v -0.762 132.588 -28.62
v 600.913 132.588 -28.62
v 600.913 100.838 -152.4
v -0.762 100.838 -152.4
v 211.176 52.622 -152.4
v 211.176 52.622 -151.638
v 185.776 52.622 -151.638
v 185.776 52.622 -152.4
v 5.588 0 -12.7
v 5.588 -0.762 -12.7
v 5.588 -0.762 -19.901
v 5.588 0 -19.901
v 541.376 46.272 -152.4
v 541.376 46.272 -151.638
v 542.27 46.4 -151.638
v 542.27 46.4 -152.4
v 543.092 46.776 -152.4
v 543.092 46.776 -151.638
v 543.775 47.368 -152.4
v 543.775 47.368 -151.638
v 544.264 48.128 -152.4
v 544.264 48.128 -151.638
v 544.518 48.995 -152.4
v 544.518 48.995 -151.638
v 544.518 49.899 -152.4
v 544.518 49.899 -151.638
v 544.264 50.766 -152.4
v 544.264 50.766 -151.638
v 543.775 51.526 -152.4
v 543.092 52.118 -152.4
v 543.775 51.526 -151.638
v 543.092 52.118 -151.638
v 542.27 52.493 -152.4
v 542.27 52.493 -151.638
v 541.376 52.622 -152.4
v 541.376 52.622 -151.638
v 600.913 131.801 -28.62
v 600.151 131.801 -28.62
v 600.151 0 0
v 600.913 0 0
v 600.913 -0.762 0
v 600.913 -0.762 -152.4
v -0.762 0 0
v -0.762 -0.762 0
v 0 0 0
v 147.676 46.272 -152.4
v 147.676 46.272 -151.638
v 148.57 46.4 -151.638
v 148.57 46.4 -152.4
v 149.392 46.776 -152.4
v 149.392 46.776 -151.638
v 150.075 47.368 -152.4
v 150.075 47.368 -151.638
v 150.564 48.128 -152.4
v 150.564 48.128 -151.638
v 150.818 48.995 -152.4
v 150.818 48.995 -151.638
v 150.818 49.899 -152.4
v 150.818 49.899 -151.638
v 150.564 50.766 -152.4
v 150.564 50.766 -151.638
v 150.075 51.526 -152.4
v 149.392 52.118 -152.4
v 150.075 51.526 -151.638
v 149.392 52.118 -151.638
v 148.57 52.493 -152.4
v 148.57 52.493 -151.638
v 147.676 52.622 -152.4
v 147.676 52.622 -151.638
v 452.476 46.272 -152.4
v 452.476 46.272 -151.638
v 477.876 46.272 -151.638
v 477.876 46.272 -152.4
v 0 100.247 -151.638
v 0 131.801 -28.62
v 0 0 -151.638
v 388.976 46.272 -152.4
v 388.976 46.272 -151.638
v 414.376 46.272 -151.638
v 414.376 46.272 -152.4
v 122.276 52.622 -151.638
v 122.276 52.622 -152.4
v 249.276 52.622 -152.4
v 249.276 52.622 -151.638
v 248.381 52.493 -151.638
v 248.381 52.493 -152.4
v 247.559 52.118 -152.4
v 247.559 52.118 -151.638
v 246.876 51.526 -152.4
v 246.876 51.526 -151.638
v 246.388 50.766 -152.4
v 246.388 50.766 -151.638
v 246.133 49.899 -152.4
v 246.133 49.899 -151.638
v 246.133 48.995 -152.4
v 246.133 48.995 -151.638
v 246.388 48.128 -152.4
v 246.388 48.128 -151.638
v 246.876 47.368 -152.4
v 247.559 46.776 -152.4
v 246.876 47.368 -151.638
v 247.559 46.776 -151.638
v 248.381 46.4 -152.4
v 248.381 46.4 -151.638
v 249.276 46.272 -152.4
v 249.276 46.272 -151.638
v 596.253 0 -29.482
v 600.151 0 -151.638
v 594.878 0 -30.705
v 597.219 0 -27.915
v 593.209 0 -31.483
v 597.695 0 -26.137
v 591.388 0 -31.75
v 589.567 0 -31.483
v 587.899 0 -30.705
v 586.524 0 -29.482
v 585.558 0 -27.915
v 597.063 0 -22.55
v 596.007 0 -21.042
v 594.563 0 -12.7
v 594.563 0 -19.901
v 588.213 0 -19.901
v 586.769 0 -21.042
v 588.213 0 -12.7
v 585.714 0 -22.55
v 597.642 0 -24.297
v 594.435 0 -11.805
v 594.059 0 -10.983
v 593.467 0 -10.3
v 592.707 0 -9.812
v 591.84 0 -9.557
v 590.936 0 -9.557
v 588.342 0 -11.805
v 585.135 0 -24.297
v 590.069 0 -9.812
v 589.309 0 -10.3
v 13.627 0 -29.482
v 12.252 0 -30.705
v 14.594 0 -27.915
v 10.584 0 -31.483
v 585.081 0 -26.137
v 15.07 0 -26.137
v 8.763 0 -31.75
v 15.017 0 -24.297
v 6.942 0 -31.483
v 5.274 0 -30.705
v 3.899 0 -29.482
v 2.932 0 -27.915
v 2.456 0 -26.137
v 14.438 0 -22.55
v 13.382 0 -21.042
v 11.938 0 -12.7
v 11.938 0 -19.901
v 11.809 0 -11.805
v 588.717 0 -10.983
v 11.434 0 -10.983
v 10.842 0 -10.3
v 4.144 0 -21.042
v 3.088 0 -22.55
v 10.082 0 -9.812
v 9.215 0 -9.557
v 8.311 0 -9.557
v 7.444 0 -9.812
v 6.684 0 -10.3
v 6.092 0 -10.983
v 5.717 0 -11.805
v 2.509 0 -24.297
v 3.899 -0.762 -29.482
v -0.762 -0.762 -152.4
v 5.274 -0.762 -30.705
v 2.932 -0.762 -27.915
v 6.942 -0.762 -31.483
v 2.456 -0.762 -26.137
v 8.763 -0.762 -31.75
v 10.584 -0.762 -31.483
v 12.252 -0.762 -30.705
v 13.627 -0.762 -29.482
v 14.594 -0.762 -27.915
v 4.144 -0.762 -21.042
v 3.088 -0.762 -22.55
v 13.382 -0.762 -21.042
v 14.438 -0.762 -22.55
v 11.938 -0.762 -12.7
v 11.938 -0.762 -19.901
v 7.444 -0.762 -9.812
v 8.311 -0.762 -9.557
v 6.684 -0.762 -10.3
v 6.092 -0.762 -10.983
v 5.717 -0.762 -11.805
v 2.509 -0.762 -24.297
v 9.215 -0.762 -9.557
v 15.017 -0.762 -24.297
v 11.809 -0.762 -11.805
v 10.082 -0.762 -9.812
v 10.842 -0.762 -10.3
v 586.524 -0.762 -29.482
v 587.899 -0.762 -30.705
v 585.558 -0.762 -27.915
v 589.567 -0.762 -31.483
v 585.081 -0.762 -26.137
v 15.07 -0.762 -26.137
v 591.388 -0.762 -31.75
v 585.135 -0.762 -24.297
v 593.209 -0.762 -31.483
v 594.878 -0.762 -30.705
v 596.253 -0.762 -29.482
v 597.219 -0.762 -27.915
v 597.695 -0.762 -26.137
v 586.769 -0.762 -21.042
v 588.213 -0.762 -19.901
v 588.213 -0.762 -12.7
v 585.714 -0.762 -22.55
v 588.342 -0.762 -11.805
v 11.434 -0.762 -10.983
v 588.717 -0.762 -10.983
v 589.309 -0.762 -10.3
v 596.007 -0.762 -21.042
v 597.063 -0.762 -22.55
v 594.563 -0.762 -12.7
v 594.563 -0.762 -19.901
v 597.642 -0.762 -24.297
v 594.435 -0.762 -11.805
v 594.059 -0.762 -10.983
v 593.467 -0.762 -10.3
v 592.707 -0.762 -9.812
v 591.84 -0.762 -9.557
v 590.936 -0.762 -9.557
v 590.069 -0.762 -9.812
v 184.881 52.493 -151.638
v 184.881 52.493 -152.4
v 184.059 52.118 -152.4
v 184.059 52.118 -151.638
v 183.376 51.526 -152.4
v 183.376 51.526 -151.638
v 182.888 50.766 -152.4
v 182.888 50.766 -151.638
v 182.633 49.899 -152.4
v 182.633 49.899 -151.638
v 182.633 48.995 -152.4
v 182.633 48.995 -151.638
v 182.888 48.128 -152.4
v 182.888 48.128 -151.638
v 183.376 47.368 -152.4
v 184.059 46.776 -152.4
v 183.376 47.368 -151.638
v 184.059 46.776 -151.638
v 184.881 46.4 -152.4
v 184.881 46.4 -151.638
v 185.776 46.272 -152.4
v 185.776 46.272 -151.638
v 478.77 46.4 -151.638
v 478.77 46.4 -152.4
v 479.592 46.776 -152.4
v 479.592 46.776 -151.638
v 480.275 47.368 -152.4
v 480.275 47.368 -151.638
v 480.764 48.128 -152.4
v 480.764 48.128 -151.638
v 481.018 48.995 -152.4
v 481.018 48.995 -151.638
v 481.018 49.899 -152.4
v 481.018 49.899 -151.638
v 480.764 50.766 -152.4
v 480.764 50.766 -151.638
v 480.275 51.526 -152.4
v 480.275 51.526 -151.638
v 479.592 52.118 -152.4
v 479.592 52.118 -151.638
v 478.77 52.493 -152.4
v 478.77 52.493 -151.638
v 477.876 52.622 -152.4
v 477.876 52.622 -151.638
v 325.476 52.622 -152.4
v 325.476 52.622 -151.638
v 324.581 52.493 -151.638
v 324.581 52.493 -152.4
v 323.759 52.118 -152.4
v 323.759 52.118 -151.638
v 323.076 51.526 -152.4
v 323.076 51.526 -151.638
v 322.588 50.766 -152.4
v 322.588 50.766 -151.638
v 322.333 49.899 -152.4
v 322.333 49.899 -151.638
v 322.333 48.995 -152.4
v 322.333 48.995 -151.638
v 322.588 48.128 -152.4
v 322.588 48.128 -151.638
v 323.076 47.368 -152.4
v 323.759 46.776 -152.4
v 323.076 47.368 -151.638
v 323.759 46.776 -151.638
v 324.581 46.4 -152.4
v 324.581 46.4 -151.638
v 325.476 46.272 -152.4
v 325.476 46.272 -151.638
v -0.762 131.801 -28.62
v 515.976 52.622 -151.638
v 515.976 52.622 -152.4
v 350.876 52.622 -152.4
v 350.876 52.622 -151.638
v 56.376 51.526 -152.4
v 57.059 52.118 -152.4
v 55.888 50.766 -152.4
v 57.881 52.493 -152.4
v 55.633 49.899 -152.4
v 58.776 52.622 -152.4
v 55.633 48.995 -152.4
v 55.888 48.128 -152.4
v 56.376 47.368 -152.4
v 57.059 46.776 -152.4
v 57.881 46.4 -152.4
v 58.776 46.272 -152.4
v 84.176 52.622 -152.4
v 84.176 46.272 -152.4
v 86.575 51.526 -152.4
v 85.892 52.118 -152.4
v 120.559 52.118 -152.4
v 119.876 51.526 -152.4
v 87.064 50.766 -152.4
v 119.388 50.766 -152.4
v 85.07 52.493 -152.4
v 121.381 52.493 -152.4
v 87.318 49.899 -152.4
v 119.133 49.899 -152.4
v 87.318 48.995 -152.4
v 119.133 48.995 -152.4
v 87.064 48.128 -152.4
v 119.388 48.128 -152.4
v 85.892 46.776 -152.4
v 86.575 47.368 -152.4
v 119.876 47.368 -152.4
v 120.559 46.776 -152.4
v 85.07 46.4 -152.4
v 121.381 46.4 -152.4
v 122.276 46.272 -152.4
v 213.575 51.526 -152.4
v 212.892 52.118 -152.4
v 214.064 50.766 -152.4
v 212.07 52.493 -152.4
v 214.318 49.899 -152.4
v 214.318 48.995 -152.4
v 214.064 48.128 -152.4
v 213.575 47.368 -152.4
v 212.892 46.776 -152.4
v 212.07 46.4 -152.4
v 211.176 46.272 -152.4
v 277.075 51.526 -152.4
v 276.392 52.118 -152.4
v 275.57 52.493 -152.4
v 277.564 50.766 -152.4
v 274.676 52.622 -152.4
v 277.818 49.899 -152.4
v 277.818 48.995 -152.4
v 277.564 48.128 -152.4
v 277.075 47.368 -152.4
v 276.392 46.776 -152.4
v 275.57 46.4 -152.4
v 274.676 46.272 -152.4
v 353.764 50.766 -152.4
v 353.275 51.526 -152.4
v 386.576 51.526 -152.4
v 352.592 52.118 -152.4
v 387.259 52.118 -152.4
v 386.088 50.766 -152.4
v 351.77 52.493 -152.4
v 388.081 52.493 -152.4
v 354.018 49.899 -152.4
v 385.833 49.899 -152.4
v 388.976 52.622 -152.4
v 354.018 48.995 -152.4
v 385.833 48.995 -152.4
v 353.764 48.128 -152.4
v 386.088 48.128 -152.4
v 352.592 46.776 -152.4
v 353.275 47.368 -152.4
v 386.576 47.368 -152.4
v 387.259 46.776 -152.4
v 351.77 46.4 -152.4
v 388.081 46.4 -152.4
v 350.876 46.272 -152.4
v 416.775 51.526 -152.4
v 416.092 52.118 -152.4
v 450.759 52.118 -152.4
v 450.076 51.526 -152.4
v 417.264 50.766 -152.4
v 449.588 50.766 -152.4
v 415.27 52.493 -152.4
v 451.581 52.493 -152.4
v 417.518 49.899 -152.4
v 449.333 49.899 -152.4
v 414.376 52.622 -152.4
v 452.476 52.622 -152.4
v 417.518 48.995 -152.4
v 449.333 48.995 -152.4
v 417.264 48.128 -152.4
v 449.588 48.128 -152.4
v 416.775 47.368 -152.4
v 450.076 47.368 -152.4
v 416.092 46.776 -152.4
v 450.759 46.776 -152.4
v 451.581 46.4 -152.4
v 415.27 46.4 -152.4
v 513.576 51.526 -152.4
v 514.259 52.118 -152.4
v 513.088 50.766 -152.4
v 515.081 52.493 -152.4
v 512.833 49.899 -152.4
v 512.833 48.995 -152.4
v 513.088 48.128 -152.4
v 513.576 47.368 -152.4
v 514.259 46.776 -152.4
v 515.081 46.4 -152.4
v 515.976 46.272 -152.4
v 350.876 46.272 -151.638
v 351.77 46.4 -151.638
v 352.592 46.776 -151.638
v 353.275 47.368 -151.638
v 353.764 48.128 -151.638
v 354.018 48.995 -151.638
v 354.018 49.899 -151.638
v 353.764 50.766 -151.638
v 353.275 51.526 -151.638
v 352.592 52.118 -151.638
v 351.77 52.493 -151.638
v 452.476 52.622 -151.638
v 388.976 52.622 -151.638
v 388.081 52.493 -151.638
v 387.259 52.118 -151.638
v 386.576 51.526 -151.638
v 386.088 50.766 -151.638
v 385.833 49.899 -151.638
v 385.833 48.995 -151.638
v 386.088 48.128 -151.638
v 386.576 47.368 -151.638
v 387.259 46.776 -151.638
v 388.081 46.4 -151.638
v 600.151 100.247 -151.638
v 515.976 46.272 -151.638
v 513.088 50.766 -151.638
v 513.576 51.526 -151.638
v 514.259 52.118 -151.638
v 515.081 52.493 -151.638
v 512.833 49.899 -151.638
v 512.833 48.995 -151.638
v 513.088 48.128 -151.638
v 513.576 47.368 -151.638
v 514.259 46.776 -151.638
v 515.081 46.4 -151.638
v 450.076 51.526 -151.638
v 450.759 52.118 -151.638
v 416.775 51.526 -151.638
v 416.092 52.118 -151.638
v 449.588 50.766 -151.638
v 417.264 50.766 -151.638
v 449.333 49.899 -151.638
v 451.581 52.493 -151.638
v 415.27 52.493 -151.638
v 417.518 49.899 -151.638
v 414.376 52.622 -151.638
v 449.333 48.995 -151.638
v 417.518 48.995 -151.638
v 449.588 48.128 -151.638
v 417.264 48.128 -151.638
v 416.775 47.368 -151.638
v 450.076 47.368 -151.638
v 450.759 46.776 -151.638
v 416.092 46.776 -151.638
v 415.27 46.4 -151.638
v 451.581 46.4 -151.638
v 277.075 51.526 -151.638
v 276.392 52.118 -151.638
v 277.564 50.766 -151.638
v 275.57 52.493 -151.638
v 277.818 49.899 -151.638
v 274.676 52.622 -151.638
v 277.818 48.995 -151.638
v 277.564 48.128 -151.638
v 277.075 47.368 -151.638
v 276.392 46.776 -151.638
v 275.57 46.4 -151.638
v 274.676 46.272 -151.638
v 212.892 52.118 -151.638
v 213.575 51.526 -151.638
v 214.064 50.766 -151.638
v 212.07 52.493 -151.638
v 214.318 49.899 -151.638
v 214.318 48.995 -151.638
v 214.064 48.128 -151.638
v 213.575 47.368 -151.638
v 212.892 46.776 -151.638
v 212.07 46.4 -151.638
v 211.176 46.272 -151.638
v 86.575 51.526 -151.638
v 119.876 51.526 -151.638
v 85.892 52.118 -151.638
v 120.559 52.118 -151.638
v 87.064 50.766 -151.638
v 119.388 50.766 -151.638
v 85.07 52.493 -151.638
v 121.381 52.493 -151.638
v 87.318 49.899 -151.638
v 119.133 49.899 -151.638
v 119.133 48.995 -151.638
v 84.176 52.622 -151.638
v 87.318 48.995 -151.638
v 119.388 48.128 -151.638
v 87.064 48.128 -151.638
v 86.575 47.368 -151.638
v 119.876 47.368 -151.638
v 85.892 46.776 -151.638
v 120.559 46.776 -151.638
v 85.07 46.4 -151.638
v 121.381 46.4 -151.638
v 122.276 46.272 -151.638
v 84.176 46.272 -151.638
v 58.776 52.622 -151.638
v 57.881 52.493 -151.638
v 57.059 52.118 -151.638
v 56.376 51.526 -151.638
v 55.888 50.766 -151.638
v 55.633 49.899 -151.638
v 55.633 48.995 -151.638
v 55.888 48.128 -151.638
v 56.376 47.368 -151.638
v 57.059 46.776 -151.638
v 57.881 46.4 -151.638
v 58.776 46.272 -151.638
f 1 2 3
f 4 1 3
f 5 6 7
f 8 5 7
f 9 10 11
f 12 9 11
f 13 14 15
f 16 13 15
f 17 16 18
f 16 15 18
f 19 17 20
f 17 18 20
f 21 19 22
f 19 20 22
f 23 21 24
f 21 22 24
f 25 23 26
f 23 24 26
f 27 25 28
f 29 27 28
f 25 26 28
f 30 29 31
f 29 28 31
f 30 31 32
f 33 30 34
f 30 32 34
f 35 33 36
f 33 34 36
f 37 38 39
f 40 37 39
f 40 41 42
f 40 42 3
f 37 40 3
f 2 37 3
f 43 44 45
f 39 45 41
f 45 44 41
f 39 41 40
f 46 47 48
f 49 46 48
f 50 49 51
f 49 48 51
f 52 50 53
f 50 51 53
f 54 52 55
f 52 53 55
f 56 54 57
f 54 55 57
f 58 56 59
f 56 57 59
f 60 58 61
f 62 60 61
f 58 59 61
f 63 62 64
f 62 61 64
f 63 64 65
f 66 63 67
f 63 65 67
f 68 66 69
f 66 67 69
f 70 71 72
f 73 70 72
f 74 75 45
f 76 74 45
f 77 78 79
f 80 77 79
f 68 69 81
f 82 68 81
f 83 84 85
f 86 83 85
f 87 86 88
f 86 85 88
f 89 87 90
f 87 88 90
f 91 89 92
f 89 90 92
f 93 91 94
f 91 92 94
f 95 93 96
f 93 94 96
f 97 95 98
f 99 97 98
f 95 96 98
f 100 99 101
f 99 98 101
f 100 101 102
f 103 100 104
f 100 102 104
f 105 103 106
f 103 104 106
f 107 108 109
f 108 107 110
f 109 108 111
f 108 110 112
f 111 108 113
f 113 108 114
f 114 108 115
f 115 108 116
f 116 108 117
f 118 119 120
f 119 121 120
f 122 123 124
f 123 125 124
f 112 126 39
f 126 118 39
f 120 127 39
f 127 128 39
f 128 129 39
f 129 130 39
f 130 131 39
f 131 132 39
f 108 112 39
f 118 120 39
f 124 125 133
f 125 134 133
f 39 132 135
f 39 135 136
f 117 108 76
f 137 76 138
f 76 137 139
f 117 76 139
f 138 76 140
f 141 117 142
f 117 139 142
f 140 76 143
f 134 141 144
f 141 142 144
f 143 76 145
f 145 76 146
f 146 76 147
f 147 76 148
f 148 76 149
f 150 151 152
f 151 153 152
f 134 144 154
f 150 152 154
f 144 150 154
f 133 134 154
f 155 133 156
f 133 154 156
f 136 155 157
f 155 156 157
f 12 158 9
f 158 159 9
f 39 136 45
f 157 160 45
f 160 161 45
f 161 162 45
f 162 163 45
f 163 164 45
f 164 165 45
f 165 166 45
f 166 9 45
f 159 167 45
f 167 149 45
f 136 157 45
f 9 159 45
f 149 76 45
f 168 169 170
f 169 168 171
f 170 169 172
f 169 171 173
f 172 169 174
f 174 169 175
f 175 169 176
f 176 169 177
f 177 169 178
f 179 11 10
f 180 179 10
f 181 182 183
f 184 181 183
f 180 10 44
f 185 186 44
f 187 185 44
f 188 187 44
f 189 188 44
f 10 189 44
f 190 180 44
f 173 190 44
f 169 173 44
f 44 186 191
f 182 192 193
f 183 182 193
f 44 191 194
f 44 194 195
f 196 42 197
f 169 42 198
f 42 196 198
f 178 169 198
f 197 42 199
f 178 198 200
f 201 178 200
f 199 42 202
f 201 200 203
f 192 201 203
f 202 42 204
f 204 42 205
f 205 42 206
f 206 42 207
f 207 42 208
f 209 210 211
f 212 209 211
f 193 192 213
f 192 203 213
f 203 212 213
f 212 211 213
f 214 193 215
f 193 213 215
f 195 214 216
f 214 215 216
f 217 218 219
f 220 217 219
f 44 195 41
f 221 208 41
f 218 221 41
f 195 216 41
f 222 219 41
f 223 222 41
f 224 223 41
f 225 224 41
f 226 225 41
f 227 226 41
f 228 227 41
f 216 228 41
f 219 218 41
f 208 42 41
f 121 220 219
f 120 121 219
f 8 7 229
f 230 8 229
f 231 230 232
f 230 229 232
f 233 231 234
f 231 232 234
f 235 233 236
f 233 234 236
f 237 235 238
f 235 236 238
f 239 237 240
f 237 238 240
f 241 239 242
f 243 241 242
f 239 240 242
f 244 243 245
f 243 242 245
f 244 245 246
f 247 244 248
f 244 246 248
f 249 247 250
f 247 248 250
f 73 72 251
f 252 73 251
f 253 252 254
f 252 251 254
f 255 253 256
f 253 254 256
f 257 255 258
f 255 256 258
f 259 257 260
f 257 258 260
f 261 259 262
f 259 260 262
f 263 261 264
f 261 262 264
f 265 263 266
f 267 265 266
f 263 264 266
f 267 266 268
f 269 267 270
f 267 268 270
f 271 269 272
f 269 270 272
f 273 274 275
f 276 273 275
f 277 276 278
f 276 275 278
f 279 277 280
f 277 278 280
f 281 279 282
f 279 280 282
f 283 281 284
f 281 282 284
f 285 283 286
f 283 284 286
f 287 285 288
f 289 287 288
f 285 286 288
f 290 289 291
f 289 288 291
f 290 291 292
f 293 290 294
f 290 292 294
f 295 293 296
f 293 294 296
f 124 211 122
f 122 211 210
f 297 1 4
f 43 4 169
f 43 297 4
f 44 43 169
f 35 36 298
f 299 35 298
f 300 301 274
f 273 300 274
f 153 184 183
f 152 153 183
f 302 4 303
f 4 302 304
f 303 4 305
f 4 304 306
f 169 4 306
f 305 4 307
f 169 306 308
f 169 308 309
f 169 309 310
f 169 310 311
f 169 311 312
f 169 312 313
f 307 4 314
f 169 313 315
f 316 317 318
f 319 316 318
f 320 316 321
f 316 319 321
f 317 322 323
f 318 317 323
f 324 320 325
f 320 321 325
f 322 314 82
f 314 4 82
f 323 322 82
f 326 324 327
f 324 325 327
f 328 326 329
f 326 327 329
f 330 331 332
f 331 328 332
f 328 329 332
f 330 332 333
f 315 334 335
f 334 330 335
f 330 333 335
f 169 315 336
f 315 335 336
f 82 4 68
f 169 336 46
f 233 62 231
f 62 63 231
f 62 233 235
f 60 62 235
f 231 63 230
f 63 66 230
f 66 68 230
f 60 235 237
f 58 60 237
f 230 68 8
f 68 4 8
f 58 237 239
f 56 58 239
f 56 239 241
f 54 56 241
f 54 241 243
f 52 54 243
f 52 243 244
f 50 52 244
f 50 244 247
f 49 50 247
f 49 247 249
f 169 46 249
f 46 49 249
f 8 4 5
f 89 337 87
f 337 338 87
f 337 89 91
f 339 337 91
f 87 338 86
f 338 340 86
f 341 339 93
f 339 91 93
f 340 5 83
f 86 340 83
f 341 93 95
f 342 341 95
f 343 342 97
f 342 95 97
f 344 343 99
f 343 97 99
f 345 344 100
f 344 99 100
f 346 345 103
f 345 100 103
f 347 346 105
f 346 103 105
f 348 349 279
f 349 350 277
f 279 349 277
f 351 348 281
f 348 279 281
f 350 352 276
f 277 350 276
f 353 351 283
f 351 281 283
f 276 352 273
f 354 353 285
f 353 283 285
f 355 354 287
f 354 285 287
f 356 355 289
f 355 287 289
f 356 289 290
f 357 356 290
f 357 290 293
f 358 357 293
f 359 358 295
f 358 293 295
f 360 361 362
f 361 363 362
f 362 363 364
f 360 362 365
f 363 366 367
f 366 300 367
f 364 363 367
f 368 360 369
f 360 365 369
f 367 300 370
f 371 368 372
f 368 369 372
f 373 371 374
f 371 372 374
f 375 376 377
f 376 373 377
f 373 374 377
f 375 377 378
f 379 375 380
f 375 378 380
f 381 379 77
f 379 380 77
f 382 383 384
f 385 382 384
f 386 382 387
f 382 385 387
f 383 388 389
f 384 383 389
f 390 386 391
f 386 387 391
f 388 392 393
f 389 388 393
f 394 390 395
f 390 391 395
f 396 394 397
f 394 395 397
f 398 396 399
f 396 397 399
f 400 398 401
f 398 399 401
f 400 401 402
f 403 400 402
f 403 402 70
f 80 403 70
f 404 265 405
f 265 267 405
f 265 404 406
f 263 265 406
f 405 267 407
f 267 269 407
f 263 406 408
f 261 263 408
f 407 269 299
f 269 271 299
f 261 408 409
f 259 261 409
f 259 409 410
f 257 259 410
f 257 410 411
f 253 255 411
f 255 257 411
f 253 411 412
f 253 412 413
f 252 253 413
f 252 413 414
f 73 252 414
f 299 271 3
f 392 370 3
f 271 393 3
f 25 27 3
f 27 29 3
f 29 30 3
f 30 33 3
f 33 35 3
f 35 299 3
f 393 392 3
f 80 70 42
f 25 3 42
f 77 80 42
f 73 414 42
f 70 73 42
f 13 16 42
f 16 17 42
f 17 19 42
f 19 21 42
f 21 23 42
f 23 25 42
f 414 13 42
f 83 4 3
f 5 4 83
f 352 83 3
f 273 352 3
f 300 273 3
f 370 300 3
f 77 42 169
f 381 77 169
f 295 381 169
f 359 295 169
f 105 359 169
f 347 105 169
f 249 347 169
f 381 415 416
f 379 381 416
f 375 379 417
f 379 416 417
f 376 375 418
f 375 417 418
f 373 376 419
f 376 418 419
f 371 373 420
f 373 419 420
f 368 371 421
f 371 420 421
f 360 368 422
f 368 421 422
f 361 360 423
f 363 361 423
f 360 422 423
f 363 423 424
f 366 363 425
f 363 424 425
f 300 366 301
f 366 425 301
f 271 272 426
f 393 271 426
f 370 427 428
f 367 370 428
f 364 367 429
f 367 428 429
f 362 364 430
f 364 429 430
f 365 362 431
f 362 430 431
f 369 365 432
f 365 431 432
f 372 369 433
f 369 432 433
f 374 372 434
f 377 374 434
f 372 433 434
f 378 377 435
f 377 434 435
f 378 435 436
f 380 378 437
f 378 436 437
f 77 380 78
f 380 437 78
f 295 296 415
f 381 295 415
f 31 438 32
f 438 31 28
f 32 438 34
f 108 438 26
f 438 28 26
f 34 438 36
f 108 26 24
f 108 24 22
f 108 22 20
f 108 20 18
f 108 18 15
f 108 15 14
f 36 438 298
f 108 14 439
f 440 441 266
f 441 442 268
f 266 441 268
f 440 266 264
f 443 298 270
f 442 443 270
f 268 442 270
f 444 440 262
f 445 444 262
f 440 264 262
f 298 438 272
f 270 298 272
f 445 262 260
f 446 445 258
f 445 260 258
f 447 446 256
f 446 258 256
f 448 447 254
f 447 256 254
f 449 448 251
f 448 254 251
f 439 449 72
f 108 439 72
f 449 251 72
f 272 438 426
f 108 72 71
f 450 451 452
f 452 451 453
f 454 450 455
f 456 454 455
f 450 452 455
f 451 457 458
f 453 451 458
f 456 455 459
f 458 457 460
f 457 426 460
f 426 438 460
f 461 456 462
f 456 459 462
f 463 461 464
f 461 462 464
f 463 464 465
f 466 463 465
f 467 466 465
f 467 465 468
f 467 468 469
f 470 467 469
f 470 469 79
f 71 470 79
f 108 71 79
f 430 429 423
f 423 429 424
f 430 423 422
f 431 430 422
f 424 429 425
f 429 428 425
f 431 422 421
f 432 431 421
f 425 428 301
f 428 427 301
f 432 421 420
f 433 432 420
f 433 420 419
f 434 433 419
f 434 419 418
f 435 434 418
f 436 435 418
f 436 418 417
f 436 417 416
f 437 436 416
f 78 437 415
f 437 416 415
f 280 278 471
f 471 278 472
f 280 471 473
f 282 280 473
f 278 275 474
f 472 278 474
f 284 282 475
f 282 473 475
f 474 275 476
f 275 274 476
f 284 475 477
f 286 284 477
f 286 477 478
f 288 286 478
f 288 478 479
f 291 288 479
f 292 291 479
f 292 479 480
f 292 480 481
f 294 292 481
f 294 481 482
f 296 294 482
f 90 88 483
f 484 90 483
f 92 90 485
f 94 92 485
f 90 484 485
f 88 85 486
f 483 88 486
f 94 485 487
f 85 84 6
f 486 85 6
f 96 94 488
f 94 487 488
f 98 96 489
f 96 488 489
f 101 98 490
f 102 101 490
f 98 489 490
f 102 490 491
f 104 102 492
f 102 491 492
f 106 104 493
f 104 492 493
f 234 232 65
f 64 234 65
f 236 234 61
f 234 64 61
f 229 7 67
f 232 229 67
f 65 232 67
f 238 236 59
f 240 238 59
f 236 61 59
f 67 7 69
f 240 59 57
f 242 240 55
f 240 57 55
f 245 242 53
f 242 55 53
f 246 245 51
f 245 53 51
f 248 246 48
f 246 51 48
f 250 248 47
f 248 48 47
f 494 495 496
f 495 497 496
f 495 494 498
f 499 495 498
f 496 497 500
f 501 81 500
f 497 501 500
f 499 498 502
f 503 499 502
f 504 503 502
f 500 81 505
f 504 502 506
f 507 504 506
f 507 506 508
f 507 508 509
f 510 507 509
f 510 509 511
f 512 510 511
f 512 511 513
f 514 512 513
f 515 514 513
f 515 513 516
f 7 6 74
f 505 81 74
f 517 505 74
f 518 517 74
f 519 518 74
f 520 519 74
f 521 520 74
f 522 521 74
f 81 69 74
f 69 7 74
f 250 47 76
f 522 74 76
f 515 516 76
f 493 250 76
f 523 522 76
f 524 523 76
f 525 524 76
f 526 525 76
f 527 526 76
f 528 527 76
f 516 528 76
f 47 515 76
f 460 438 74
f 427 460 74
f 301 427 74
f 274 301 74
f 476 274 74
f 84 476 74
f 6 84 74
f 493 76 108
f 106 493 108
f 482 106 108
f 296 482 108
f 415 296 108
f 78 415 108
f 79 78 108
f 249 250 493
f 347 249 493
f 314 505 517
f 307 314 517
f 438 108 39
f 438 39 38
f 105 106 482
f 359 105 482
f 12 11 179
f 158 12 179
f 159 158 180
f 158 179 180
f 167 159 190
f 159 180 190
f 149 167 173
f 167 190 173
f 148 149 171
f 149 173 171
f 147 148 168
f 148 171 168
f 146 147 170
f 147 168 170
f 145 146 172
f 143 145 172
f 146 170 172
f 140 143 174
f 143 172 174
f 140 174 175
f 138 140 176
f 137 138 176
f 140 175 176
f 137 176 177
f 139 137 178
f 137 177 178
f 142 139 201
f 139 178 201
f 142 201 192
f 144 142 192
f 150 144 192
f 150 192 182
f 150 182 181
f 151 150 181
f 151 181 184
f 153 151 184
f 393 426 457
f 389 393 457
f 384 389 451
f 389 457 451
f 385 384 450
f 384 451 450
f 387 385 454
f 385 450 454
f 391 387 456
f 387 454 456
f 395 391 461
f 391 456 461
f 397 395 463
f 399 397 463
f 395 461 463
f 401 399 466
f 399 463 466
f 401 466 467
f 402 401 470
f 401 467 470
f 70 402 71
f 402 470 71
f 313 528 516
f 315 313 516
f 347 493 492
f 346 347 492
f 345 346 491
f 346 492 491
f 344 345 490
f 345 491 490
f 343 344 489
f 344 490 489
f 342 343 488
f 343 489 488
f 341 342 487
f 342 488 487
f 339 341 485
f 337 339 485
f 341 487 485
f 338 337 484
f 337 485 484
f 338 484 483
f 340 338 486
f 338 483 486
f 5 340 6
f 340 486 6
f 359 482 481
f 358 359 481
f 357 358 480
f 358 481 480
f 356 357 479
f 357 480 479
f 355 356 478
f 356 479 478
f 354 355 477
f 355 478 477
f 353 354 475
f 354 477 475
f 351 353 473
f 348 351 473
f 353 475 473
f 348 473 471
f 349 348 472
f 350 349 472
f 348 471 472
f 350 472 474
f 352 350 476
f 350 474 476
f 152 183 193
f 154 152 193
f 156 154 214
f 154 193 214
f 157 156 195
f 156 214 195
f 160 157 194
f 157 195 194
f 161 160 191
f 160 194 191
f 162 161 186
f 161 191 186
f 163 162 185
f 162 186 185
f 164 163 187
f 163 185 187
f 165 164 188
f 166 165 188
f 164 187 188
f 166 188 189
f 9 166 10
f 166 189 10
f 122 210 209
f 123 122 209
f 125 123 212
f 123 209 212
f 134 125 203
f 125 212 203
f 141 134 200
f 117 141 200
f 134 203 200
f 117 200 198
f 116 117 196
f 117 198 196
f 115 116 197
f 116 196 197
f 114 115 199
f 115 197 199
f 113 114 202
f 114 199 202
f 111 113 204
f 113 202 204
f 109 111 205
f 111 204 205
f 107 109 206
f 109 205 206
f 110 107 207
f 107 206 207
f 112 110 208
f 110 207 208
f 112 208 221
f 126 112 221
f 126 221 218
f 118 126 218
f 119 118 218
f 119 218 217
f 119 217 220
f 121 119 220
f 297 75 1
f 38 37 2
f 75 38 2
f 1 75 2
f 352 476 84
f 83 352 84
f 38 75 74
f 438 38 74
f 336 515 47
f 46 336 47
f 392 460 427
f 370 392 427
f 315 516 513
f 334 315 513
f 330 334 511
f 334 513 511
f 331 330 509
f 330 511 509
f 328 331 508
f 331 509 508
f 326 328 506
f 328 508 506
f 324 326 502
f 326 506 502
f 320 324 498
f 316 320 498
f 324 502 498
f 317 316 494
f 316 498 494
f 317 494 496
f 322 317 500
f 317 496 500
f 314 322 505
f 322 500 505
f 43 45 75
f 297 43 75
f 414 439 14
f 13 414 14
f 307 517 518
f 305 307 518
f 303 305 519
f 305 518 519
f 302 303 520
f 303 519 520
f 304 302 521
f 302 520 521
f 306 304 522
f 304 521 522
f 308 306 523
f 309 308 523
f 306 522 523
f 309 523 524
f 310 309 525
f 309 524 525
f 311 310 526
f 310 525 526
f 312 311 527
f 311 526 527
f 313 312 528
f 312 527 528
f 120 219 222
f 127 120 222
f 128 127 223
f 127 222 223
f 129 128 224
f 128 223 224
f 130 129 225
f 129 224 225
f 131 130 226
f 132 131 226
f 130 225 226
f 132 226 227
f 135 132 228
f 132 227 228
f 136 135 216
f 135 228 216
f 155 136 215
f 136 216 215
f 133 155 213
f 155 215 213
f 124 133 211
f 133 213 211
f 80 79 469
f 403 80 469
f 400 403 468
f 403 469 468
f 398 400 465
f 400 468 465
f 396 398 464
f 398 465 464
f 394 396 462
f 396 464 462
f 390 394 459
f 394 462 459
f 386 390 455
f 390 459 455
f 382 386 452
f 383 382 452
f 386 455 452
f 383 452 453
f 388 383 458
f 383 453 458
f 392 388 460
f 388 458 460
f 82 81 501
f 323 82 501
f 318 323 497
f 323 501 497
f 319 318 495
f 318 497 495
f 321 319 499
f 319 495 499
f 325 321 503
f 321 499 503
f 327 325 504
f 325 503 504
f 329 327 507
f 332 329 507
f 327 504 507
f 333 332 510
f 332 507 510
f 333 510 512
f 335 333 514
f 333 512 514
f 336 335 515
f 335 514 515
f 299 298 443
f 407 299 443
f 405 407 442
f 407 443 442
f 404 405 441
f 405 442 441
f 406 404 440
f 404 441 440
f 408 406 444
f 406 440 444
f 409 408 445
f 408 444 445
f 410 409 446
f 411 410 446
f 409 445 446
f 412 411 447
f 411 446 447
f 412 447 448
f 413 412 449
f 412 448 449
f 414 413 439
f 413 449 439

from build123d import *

# Parameters (mm, degrees)
F1_DEPTH = 600.1512
F3_DEPTH = 0.762
F5_DEPTH = 0.762
F7_DEPTH = 0.762
F9_DEPTH = 25.4


with BuildPart() as f1:
    # F0 (on Right) → F1 (new body)
    with BuildSketch(Plane.YZ):
        Polygon((0, -151.638), (0, 0), (-0.762, 0), (-0.762, -152.4), (100.838, -152.4), (132.588, -28.620478), (131.801332, -28.620478), (100.246788, -151.638), align=None)
    extrude(amount=F1_DEPTH)

    # F2 (on face) → F3 (join)
    with BuildSketch(Plane.YZ.offset(600.1512)):
        Polygon((0, 0), (-0.762, 0), (-0.762, -152.4), (100.838, -152.4), (132.588, -28.620478), (131.801332, -28.620478), align=None)
    extrude(amount=F3_DEPTH)

    # F4 (on face) → F5 (join)
    with BuildSketch(Plane(origin=(0, 0, 0), x_dir=(0, -1, 0), z_dir=(-1, 0, 0))):
        Polygon((0.762, -152.4), (0.762, 0), (0, 0), (-131.801332, -28.620478), (-132.588, -28.620478), (-100.838, -152.4), align=None)
    extrude(amount=F5_DEPTH)

    # F6 (on face) → F7 (cut)
    with BuildSketch(Plane.XZ.offset(0.762)):
        with BuildLine():
            Line((5.588, -12.7), (5.588, -19.900739))
            ThreePointArc((5.588, -19.900739), (8.763, -31.75), (11.938, -19.900739))
            Line((11.938, -19.900739), (11.938, -12.7))
            ThreePointArc((11.938, -12.7), (8.763, -9.525), (5.588, -12.7))
        make_face()
        with BuildLine():
            ThreePointArc((588.2132, -19.900739), (591.3882, -31.75), (594.5632, -19.900739))
            Line((594.5632, -19.900739), (594.5632, -12.7))
            ThreePointArc((594.5632, -12.7), (591.3882, -9.525), (588.2132, -12.7))
            Line((588.2132, -12.7), (588.2132, -19.900739))
        make_face()
    extrude(amount=-F7_DEPTH, mode=Mode.SUBTRACT)

    # F8 (on face) → F9 (cut)
    with BuildSketch(Plane.XY.offset(-151.638)):
        with BuildLine():
            Line((84.1756, 52.621788), (58.7756, 52.621788))
            ThreePointArc((58.7756, 52.621788), (55.6006, 49.446788), (58.7756, 46.271788))
            Line((58.7756, 46.271788), (84.1756, 46.271788))
            ThreePointArc((84.1756, 46.271788), (87.3506, 49.446788), (84.1756, 52.621788))
        make_face()
        with BuildLine():
            Line((147.6756, 52.621788), (122.2756, 52.621788))
            ThreePointArc((122.2756, 52.621788), (119.1006, 49.446788), (122.2756, 46.271788))
            Line((122.2756, 46.271788), (147.6756, 46.271788))
            ThreePointArc((147.6756, 46.271788), (150.8506, 49.446788), (147.6756, 52.621788))
        make_face()
        with BuildLine():
            Line((211.1756, 52.621788), (185.7756, 52.621788))
            ThreePointArc((185.7756, 52.621788), (182.6006, 49.446788), (185.7756, 46.271788))
            Line((185.7756, 46.271788), (211.1756, 46.271788))
            ThreePointArc((211.1756, 46.271788), (214.3506, 49.446788), (211.1756, 52.621788))
        make_face()
        with BuildLine():
            Line((274.6756, 52.621788), (249.2756, 52.621788))
            ThreePointArc((249.2756, 52.621788), (246.1006, 49.446788), (249.2756, 46.271788))
            Line((249.2756, 46.271788), (274.6756, 46.271788))
            ThreePointArc((274.6756, 46.271788), (277.8506, 49.446788), (274.6756, 52.621788))
        make_face()
        with BuildLine():
            ThreePointArc((350.8756, 46.271788), (354.0506, 49.446788), (350.8756, 52.621788))
            Line((350.8756, 52.621788), (325.4756, 52.621788))
            ThreePointArc((325.4756, 52.621788), (322.3006, 49.446788), (325.4756, 46.271788))
            Line((325.4756, 46.271788), (350.8756, 46.271788))
        make_face()
        with BuildLine():
            ThreePointArc((388.9756, 52.621788), (385.8006, 49.446788), (388.9756, 46.271788))
            Line((388.9756, 46.271788), (414.3756, 46.271788))
            ThreePointArc((414.3756, 46.271788), (417.5506, 49.446788), (414.3756, 52.621788))
            Line((414.3756, 52.621788), (388.9756, 52.621788))
        make_face()
        with BuildLine():
            ThreePointArc((452.4756, 52.621788), (449.3006, 49.446788), (452.4756, 46.271788))
            Line((452.4756, 46.271788), (477.8756, 46.271788))
            ThreePointArc((477.8756, 46.271788), (481.0506, 49.446788), (477.8756, 52.621788))
            Line((477.8756, 52.621788), (452.4756, 52.621788))
        make_face()
        with BuildLine():
            ThreePointArc((541.3756, 46.271788), (544.5506, 49.446788), (541.3756, 52.621788))
            Line((541.3756, 52.621788), (515.9756, 52.621788))
            ThreePointArc((515.9756, 52.621788), (512.8006, 49.446788), (515.9756, 46.271788))
            Line((515.9756, 46.271788), (541.3756, 46.271788))
        make_face()
    extrude(amount=-F9_DEPTH, mode=Mode.SUBTRACT)


solid = f1.part
